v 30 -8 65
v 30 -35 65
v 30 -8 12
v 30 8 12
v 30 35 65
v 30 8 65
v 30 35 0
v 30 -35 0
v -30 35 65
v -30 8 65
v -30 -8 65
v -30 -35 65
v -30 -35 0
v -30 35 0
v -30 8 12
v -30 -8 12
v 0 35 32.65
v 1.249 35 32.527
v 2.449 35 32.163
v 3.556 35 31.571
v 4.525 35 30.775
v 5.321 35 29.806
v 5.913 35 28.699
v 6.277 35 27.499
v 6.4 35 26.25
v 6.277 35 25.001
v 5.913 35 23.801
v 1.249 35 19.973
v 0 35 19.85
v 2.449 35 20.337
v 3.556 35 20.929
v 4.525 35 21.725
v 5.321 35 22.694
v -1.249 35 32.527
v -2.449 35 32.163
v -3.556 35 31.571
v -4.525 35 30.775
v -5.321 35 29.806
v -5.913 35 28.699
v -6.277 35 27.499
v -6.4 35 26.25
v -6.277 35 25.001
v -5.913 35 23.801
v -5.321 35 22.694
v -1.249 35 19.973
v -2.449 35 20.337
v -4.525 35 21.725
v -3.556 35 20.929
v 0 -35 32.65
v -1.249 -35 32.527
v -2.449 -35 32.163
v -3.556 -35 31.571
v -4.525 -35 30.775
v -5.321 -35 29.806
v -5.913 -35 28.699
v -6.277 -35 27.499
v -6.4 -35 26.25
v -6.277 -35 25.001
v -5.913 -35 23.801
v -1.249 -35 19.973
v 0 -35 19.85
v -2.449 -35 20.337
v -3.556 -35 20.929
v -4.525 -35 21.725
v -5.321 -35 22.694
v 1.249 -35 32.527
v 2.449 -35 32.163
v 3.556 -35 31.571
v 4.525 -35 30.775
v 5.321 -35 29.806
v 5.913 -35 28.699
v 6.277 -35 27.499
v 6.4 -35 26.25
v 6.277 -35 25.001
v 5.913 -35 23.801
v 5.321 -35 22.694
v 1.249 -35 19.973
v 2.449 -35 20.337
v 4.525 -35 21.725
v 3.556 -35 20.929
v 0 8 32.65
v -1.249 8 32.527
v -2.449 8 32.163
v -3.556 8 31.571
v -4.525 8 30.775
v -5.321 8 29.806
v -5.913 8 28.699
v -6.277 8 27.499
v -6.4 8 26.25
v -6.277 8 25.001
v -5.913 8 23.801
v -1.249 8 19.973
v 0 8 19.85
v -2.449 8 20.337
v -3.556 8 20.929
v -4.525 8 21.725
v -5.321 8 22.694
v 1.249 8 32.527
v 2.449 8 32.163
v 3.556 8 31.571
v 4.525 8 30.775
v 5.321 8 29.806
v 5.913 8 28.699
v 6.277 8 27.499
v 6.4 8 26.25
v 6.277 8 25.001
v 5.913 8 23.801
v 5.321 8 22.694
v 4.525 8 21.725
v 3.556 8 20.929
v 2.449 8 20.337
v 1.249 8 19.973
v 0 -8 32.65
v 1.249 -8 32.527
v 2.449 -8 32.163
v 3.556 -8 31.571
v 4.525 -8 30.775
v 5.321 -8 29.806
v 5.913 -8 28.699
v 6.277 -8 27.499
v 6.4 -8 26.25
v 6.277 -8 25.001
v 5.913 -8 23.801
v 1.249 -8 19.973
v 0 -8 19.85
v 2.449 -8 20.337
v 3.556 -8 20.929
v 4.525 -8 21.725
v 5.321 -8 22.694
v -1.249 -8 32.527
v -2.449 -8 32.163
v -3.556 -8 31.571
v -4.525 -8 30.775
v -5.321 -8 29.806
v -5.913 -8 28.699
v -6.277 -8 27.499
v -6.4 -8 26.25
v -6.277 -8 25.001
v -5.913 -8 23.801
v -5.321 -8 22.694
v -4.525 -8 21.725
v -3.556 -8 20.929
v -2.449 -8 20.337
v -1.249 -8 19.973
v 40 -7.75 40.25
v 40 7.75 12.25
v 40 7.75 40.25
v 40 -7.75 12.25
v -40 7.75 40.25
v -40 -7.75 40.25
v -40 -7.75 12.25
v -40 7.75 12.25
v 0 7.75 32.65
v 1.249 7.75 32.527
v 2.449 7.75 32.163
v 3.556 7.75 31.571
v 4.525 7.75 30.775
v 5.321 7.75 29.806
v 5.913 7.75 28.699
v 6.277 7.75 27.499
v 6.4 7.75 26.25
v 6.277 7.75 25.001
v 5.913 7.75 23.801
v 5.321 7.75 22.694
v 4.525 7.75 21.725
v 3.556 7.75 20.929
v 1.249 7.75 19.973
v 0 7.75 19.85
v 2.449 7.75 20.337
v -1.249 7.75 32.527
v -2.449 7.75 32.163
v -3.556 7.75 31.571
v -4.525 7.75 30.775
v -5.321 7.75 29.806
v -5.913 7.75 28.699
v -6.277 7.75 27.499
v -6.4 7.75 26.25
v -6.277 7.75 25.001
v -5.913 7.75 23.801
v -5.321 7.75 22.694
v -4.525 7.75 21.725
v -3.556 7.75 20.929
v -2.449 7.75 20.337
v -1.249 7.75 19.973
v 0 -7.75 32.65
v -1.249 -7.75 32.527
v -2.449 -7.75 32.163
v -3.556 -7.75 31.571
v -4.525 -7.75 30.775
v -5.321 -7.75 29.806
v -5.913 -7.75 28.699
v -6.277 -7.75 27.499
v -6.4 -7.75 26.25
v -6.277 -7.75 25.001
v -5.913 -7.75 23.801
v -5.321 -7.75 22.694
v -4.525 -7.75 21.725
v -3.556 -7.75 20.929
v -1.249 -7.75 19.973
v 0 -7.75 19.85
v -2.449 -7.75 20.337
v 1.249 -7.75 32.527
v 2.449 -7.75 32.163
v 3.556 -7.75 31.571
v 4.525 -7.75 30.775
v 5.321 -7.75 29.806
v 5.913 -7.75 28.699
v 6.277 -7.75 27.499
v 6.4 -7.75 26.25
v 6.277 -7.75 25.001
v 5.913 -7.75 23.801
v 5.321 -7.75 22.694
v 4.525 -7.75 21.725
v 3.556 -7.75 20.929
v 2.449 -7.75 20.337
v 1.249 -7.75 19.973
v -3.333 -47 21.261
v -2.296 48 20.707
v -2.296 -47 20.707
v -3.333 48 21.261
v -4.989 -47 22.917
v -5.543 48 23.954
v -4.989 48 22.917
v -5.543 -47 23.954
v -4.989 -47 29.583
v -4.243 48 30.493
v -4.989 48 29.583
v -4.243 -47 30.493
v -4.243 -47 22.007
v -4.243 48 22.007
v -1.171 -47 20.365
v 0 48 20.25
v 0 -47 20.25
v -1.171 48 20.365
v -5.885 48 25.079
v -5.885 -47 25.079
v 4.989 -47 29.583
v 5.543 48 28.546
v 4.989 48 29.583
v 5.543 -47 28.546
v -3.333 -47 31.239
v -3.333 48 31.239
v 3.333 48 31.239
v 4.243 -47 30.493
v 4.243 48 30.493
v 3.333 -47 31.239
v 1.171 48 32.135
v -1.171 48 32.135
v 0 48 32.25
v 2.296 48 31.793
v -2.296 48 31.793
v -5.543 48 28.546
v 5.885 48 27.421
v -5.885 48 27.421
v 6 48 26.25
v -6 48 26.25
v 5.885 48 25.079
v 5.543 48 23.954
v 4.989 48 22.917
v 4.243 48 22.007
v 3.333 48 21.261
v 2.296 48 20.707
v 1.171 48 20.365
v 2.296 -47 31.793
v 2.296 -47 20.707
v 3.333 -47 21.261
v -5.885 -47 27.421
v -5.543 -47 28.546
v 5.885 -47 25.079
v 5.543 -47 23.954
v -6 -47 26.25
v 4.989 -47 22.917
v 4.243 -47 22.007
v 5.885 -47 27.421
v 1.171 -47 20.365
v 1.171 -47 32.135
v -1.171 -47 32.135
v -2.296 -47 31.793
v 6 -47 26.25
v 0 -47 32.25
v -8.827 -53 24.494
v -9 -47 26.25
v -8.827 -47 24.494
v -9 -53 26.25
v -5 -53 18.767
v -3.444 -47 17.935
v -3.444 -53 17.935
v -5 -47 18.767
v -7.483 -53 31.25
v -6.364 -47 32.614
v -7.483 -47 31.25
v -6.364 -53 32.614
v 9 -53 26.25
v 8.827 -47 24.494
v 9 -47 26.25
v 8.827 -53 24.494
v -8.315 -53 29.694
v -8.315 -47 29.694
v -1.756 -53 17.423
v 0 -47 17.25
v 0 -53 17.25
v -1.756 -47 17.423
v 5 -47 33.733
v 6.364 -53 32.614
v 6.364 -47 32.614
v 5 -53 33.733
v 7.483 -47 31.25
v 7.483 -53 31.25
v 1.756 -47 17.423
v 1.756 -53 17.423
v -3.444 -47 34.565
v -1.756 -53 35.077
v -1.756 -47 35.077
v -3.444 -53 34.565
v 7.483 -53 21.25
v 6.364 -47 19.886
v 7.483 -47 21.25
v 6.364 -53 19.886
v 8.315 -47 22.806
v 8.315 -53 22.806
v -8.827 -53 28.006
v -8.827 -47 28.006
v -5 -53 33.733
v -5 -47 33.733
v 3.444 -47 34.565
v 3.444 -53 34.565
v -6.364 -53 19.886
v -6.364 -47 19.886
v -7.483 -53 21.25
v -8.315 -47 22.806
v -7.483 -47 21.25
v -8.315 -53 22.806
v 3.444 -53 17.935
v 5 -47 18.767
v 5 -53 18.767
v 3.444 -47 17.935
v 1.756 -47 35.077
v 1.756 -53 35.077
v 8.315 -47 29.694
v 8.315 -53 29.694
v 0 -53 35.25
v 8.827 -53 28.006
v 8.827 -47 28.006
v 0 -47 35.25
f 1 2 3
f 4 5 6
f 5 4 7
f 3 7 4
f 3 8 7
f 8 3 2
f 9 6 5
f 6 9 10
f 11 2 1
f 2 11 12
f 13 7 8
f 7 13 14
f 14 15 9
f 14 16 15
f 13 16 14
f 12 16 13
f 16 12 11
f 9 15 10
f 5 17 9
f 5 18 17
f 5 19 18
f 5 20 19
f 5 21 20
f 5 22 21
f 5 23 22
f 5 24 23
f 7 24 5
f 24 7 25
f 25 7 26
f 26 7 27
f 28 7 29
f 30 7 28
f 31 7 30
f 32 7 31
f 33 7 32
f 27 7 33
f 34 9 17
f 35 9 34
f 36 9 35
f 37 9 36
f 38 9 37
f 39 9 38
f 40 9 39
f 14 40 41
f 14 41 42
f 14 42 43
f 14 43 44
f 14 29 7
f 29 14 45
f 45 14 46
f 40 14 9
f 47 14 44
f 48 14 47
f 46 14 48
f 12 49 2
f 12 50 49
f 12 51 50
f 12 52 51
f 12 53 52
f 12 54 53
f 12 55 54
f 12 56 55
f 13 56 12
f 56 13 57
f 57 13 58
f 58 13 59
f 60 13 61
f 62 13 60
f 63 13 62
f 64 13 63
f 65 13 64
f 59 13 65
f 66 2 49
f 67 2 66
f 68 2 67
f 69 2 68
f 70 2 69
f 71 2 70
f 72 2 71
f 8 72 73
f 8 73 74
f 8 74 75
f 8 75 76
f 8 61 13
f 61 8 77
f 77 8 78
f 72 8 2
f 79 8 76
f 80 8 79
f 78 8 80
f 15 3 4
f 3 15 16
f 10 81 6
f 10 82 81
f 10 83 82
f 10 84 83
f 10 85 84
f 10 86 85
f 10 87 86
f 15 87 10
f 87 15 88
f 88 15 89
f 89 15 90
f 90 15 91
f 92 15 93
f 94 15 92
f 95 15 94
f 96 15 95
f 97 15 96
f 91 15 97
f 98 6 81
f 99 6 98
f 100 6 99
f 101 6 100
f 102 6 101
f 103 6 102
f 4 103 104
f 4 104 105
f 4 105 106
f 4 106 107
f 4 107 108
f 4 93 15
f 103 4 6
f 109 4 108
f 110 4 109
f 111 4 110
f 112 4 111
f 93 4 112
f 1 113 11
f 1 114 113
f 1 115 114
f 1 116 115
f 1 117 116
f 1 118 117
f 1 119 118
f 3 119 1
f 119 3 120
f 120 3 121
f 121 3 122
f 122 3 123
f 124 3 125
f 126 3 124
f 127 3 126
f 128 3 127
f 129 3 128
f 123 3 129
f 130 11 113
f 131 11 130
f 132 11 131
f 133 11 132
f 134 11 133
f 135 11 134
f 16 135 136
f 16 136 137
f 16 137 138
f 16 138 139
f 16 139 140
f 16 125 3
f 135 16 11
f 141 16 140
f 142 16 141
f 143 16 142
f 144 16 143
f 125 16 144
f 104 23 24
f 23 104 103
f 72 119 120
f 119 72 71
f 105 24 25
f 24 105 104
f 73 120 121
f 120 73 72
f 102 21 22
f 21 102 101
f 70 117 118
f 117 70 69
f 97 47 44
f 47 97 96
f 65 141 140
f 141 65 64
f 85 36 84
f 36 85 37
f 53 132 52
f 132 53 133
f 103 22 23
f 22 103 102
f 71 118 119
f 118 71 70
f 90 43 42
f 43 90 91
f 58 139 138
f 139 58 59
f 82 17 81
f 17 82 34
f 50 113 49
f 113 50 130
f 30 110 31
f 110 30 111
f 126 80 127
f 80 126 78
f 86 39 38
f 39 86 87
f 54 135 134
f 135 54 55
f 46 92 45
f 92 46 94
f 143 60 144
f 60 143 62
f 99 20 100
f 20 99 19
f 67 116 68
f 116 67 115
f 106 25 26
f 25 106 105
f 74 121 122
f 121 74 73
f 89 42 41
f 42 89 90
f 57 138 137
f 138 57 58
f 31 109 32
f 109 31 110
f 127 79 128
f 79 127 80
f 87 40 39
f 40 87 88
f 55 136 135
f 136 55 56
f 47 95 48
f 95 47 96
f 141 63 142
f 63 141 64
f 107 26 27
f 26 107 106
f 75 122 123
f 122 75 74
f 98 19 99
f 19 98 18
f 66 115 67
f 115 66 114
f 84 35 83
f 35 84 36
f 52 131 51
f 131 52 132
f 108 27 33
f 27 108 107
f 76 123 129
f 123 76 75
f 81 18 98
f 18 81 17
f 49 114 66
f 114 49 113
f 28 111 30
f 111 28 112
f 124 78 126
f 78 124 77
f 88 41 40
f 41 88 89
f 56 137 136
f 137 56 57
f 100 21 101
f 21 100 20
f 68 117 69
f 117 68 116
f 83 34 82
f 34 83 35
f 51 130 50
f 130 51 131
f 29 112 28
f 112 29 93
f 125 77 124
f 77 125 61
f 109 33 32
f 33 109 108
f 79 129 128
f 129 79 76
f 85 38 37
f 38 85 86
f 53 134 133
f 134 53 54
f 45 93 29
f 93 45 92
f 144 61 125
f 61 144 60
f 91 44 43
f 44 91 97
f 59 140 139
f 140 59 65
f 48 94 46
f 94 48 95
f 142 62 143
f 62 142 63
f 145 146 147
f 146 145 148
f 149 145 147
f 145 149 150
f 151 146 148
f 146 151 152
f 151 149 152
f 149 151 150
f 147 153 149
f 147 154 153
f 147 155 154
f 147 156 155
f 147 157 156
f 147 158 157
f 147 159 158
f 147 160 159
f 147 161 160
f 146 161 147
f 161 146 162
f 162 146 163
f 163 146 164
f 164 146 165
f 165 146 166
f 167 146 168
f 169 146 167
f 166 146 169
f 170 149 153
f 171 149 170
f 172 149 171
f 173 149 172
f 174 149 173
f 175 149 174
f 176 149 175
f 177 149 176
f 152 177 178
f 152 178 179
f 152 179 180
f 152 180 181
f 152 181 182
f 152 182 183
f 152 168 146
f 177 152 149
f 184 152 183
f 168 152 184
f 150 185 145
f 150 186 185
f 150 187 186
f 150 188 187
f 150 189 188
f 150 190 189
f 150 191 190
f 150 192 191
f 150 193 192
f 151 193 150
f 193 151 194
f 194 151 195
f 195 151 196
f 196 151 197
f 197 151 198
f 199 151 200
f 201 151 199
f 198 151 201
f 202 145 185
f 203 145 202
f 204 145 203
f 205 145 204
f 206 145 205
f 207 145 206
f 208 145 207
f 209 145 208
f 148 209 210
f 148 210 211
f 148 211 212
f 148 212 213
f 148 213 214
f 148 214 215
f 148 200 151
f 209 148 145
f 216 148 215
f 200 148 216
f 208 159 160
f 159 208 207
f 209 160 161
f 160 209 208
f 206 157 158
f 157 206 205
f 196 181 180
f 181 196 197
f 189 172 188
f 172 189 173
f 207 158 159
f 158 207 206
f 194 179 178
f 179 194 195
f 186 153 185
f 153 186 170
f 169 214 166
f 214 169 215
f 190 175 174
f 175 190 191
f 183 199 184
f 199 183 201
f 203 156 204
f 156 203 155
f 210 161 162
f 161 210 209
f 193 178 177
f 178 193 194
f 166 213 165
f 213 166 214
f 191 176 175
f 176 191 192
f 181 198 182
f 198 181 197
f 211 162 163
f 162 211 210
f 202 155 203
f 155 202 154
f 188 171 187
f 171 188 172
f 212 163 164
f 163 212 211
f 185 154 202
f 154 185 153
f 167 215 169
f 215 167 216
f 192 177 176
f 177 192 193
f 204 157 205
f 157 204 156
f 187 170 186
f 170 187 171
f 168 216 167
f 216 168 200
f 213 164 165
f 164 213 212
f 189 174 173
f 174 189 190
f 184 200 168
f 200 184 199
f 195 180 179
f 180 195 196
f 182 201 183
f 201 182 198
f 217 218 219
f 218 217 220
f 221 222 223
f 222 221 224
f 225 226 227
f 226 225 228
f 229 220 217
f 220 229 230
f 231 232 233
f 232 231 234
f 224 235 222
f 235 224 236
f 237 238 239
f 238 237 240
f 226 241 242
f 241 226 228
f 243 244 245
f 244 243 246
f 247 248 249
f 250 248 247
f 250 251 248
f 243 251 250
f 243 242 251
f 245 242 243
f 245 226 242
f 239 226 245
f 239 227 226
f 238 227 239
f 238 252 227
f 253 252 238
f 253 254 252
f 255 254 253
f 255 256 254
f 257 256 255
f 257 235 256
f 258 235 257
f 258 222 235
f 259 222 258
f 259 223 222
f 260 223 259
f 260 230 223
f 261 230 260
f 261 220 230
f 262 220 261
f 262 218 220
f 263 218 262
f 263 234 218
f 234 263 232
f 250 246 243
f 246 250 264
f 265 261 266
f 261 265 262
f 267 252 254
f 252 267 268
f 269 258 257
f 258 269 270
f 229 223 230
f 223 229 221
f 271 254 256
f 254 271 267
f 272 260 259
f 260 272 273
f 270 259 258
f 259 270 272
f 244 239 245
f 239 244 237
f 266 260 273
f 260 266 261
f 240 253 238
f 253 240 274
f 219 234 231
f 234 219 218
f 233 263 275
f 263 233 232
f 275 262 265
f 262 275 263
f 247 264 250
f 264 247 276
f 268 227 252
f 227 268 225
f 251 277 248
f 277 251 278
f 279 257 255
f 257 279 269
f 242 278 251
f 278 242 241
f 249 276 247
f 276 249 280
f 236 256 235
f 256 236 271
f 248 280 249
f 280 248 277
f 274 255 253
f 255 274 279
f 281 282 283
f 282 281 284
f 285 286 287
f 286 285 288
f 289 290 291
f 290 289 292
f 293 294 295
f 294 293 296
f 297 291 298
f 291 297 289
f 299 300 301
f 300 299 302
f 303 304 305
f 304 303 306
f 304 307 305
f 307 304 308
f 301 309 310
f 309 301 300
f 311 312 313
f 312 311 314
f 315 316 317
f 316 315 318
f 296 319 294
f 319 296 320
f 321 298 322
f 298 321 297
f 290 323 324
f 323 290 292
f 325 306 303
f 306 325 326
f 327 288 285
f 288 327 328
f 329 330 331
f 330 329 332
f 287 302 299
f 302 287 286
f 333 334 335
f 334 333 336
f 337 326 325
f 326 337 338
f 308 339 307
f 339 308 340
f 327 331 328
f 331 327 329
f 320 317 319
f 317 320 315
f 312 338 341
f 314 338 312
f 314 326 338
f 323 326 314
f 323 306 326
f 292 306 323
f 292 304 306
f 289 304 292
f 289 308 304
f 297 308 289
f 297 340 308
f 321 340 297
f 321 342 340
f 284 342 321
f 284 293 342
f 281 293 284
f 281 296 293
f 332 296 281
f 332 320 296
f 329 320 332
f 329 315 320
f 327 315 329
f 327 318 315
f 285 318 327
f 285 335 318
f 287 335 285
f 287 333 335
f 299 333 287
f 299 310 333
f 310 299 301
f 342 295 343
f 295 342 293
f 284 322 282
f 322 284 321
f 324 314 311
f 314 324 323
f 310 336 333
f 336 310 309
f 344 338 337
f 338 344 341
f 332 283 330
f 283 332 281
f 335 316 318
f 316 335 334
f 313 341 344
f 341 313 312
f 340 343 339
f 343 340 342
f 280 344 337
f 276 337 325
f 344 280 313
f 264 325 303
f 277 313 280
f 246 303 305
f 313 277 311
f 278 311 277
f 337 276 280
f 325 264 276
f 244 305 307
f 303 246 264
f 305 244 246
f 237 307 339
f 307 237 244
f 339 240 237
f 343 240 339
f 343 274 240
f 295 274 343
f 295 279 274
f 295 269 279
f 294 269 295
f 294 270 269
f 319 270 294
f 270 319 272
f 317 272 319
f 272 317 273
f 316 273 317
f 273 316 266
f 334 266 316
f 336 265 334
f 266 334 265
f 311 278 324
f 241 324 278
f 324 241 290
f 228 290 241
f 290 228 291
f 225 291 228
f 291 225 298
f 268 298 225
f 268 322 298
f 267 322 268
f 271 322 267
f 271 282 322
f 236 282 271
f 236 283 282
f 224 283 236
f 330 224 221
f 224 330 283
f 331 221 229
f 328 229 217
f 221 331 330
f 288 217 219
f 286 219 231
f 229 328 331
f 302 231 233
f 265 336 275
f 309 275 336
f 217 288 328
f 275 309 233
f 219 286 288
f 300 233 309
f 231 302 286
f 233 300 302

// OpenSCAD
$fn = 32;

// ------------------------------------------------------------------------
// Clevis joint: 60 mm clevis, pin d12
// Every part is its own module, assembly() places them once.
// ------------------------------------------------------------------------

// --- part 1 ---
module clevis() {
  difference() {
    translate([-30, -35, 0]) cube([60, 70, 65]);
    translate([-31, -8, 12]) cube([62, 16, 54]);
    translate([0, 0, 26.25]) rotate([90, 0, 0]) cylinder(h = 72, d = 12.8, center = true);
  }
}

// --- part 2 ---
module eye() {
  difference() {
    translate([-40, -7.75, 0]) cube([80, 15.5, 28]);
    translate([0, 0, 14]) rotate([90, 0, 0]) cylinder(h = 17.5, d = 12.8, center = true);
  }
}

// --- part 3 ---
module pin() {
  rotate([0, 90, 0]) cylinder(h = 96, d = 12, center = true);
  translate([-53, 0, 0]) rotate([0, 90, 0]) cylinder(h = 6, d = 18);
}

// --- assembly ---
module assembly() {
  translate([0, 0, 0]) rotate([0, 0, 0]) clevis();
  translate([0, 0, 12.25]) rotate([0, 0, 0]) eye();
  translate([0, 0, 26.25]) rotate([0, 0, 90]) pin();
}

assembly();
